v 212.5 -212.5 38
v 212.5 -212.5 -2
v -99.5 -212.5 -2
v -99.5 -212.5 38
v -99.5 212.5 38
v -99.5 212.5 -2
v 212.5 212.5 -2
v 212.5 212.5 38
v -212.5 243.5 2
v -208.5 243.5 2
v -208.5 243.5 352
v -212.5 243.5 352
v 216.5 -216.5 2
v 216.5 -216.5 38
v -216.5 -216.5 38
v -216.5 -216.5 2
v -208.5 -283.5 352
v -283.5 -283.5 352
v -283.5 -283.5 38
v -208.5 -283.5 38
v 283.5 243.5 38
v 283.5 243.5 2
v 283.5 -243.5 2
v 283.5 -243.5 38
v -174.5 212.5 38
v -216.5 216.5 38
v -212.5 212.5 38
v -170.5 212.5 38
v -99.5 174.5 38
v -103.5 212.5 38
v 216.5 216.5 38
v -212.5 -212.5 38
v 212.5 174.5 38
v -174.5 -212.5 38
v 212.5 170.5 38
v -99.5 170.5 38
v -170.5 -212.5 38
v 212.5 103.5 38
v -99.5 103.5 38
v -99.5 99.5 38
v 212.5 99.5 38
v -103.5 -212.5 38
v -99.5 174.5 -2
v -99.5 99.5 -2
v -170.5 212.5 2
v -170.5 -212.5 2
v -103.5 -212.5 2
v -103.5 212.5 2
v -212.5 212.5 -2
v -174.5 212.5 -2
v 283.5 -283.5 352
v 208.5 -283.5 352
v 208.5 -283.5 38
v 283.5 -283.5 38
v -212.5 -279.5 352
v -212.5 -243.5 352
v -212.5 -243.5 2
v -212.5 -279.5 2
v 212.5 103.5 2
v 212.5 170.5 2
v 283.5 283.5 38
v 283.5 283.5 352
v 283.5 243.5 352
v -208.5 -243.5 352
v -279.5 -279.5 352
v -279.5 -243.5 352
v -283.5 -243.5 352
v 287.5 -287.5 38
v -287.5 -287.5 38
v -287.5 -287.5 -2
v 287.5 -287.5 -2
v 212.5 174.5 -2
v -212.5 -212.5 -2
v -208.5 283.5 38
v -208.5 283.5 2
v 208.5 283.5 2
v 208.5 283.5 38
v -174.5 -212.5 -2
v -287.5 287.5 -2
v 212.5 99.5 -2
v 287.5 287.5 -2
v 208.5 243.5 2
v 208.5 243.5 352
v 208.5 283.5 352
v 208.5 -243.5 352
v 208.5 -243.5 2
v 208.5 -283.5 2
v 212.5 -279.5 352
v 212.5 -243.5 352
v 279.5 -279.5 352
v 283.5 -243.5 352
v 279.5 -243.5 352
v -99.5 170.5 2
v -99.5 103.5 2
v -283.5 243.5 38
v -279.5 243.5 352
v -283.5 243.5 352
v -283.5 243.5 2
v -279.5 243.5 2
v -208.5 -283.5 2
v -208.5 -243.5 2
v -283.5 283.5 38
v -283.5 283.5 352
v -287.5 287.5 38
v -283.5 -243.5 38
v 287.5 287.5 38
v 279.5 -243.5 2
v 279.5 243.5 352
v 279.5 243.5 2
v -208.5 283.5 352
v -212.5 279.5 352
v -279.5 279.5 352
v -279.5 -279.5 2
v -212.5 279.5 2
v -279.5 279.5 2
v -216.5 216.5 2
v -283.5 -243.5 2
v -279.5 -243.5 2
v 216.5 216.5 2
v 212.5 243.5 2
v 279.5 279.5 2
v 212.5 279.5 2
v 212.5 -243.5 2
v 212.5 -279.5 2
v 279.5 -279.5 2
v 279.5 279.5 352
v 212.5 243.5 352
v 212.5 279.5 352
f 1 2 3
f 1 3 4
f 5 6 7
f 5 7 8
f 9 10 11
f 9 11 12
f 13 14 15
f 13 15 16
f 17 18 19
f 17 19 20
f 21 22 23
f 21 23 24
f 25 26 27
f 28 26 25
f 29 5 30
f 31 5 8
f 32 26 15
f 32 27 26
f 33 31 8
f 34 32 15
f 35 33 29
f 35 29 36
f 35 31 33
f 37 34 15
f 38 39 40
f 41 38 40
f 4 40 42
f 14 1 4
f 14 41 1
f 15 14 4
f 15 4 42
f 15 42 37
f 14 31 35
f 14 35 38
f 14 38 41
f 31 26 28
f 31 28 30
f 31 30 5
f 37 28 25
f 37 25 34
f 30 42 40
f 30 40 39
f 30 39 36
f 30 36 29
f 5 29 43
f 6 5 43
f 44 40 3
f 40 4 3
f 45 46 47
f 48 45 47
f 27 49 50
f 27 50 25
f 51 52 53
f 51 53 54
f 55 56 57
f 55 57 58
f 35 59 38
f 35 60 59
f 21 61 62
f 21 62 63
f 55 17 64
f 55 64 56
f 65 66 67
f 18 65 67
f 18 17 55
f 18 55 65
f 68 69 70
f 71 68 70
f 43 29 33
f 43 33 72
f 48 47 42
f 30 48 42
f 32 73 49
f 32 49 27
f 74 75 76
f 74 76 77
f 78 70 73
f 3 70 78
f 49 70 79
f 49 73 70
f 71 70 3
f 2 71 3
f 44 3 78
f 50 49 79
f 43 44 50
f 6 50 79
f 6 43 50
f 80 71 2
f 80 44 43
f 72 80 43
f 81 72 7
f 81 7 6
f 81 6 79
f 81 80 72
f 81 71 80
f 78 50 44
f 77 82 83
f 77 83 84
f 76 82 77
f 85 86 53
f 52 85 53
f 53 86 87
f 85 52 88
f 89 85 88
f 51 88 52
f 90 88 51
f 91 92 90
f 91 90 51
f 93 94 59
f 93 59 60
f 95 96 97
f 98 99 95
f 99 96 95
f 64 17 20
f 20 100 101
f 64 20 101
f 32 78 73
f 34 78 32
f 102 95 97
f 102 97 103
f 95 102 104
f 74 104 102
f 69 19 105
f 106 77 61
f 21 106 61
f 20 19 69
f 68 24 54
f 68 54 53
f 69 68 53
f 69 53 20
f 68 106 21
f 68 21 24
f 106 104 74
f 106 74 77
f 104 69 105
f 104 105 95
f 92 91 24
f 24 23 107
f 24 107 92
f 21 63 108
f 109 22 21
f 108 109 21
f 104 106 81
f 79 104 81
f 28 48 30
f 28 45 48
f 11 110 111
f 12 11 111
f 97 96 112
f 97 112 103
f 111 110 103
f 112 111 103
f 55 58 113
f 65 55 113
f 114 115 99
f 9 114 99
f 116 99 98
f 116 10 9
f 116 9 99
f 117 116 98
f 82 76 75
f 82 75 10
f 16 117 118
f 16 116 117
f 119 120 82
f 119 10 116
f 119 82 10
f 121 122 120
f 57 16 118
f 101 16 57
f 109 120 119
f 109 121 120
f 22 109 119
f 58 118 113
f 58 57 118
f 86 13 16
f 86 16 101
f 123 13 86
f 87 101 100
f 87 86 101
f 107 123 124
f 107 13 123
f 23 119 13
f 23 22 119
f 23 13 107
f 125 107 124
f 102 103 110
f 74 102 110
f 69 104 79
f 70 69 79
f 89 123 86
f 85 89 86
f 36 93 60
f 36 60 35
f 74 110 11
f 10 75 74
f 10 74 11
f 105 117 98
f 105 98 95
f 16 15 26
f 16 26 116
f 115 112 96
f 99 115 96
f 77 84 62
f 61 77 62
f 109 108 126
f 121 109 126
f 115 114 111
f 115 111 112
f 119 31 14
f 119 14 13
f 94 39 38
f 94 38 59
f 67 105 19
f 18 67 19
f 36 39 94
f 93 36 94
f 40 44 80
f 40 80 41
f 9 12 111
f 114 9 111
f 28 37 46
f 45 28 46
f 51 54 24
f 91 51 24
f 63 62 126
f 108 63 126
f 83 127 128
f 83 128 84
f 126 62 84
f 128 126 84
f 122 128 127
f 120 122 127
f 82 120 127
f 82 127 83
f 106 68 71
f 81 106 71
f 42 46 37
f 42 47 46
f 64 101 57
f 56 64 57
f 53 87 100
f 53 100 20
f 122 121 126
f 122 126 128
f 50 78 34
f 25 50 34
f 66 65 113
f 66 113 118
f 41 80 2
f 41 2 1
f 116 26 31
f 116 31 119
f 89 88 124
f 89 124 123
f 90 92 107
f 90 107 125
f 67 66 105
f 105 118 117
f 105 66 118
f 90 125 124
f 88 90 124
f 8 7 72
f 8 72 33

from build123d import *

# Parameters (mm, degrees)
BOSS_EXTRUDE1_DEPTH  = 350
LPATTERN1_COUNT      = 2
LPATTERN1_PITCH      = 492
MIRROR1_COPY_1_DEPTH = 350
MIRROR1_COPY_2_DEPTH = 350


with BuildPart() as part:
    # Sweep1: sweep along a path in Sketch1
    with BuildLine(Plane.XY) as sweep1_path:
        Line((-250, -250), (250, -250))
        Line((250, -250), (250, 250))
        Line((250, 250), (-250, 250))
        Line((-250, 250), (-250, -250))
    # Sketch2 → Sweep1 (sweep)
    with BuildSketch(Plane(origin=(0, -250, 0), x_dir=(1, 0, 0), z_dir=(0, 1, 0))):
        Polygon((212.5, 2), (287.5, 2), (287.5, -38), (283.5, -38), (283.5, -2), (216.5, -2), (216.5, -38), (212.5, -38), align=None)
    sweep(path=sweep1_path.line, transition=Transition.RIGHT)

    # Sweep3: sweep along a path in Sketch4
    with BuildLine(Plane.XY) as sweep3_path:
        Line((-137, 212.5), (-137, -212.5))
    # Sketch5 → Sweep3 (sweep)
    with BuildSketch(Plane(origin=(0, -212.5, 0), x_dir=(1, 0, 0), z_dir=(0, 1, 0))):
        Polygon((-174.5, 2), (-99.5, 2), (-99.5, -38), (-103.5, -38), (-103.5, -2), (-170.5, -2), (-170.5, -38), (-174.5, -38), align=None)
    sweep(path=sweep3_path.line)

    # Sweep4: sweep along a path in Sketch6
    with BuildLine(Plane.XY) as sweep4_path:
        Line((212.5, 137), (-99.5, 137))
    # Sketch7 → Sweep4 (sweep)
    with BuildSketch(Plane.ZY.offset(-212.5)):
        Polygon((-2, 99.5), (-2, 174.5), (38, 174.5), (38, 170.5), (2, 170.5), (2, 103.5), (38, 103.5), (38, 99.5), align=None)
    sweep(path=sweep4_path.line)

    # Sketch8 → Boss-Extrude1 (add)
    with BuildSketch(Plane.XY.offset(2)):
        Polygon((-283.5, 283.5), (-208.5, 283.5), (-208.5, 243.5), (-212.5, 243.5), (-212.5, 279.5), (-279.5, 279.5), (-279.5, 243.5), (-283.5, 243.5), align=None)
    boss_extrude1 = extrude(amount=BOSS_EXTRUDE1_DEPTH)

    # LPattern1: Boss-Extrude1 ×2
    with Locations(*[(i * LPATTERN1_PITCH, 0, 0) for i in range(1, LPATTERN1_COUNT)]):
        add(boss_extrude1)

    # Mirror1 copy 1 sketch → Mirror1 copy 1 (add)
    with BuildSketch(Plane(origin=(492, 0, 2), x_dir=(1, 0, 0), z_dir=(0, 0, 1))):
        Polygon((-283.5, -283.5), (-208.5, -283.5), (-208.5, -243.5), (-212.5, -243.5), (-212.5, -279.5), (-279.5, -279.5), (-279.5, -243.5), (-283.5, -243.5), align=None)
    extrude(amount=MIRROR1_COPY_1_DEPTH)

    # Mirror1 copy 2 sketch → Mirror1 copy 2 (add)
    with BuildSketch(Plane.XY.offset(2)):
        Polygon((-283.5, -283.5), (-208.5, -283.5), (-208.5, -243.5), (-212.5, -243.5), (-212.5, -279.5), (-279.5, -279.5), (-279.5, -243.5), (-283.5, -243.5), align=None)
    extrude(amount=MIRROR1_COPY_2_DEPTH)


solid = part.part
